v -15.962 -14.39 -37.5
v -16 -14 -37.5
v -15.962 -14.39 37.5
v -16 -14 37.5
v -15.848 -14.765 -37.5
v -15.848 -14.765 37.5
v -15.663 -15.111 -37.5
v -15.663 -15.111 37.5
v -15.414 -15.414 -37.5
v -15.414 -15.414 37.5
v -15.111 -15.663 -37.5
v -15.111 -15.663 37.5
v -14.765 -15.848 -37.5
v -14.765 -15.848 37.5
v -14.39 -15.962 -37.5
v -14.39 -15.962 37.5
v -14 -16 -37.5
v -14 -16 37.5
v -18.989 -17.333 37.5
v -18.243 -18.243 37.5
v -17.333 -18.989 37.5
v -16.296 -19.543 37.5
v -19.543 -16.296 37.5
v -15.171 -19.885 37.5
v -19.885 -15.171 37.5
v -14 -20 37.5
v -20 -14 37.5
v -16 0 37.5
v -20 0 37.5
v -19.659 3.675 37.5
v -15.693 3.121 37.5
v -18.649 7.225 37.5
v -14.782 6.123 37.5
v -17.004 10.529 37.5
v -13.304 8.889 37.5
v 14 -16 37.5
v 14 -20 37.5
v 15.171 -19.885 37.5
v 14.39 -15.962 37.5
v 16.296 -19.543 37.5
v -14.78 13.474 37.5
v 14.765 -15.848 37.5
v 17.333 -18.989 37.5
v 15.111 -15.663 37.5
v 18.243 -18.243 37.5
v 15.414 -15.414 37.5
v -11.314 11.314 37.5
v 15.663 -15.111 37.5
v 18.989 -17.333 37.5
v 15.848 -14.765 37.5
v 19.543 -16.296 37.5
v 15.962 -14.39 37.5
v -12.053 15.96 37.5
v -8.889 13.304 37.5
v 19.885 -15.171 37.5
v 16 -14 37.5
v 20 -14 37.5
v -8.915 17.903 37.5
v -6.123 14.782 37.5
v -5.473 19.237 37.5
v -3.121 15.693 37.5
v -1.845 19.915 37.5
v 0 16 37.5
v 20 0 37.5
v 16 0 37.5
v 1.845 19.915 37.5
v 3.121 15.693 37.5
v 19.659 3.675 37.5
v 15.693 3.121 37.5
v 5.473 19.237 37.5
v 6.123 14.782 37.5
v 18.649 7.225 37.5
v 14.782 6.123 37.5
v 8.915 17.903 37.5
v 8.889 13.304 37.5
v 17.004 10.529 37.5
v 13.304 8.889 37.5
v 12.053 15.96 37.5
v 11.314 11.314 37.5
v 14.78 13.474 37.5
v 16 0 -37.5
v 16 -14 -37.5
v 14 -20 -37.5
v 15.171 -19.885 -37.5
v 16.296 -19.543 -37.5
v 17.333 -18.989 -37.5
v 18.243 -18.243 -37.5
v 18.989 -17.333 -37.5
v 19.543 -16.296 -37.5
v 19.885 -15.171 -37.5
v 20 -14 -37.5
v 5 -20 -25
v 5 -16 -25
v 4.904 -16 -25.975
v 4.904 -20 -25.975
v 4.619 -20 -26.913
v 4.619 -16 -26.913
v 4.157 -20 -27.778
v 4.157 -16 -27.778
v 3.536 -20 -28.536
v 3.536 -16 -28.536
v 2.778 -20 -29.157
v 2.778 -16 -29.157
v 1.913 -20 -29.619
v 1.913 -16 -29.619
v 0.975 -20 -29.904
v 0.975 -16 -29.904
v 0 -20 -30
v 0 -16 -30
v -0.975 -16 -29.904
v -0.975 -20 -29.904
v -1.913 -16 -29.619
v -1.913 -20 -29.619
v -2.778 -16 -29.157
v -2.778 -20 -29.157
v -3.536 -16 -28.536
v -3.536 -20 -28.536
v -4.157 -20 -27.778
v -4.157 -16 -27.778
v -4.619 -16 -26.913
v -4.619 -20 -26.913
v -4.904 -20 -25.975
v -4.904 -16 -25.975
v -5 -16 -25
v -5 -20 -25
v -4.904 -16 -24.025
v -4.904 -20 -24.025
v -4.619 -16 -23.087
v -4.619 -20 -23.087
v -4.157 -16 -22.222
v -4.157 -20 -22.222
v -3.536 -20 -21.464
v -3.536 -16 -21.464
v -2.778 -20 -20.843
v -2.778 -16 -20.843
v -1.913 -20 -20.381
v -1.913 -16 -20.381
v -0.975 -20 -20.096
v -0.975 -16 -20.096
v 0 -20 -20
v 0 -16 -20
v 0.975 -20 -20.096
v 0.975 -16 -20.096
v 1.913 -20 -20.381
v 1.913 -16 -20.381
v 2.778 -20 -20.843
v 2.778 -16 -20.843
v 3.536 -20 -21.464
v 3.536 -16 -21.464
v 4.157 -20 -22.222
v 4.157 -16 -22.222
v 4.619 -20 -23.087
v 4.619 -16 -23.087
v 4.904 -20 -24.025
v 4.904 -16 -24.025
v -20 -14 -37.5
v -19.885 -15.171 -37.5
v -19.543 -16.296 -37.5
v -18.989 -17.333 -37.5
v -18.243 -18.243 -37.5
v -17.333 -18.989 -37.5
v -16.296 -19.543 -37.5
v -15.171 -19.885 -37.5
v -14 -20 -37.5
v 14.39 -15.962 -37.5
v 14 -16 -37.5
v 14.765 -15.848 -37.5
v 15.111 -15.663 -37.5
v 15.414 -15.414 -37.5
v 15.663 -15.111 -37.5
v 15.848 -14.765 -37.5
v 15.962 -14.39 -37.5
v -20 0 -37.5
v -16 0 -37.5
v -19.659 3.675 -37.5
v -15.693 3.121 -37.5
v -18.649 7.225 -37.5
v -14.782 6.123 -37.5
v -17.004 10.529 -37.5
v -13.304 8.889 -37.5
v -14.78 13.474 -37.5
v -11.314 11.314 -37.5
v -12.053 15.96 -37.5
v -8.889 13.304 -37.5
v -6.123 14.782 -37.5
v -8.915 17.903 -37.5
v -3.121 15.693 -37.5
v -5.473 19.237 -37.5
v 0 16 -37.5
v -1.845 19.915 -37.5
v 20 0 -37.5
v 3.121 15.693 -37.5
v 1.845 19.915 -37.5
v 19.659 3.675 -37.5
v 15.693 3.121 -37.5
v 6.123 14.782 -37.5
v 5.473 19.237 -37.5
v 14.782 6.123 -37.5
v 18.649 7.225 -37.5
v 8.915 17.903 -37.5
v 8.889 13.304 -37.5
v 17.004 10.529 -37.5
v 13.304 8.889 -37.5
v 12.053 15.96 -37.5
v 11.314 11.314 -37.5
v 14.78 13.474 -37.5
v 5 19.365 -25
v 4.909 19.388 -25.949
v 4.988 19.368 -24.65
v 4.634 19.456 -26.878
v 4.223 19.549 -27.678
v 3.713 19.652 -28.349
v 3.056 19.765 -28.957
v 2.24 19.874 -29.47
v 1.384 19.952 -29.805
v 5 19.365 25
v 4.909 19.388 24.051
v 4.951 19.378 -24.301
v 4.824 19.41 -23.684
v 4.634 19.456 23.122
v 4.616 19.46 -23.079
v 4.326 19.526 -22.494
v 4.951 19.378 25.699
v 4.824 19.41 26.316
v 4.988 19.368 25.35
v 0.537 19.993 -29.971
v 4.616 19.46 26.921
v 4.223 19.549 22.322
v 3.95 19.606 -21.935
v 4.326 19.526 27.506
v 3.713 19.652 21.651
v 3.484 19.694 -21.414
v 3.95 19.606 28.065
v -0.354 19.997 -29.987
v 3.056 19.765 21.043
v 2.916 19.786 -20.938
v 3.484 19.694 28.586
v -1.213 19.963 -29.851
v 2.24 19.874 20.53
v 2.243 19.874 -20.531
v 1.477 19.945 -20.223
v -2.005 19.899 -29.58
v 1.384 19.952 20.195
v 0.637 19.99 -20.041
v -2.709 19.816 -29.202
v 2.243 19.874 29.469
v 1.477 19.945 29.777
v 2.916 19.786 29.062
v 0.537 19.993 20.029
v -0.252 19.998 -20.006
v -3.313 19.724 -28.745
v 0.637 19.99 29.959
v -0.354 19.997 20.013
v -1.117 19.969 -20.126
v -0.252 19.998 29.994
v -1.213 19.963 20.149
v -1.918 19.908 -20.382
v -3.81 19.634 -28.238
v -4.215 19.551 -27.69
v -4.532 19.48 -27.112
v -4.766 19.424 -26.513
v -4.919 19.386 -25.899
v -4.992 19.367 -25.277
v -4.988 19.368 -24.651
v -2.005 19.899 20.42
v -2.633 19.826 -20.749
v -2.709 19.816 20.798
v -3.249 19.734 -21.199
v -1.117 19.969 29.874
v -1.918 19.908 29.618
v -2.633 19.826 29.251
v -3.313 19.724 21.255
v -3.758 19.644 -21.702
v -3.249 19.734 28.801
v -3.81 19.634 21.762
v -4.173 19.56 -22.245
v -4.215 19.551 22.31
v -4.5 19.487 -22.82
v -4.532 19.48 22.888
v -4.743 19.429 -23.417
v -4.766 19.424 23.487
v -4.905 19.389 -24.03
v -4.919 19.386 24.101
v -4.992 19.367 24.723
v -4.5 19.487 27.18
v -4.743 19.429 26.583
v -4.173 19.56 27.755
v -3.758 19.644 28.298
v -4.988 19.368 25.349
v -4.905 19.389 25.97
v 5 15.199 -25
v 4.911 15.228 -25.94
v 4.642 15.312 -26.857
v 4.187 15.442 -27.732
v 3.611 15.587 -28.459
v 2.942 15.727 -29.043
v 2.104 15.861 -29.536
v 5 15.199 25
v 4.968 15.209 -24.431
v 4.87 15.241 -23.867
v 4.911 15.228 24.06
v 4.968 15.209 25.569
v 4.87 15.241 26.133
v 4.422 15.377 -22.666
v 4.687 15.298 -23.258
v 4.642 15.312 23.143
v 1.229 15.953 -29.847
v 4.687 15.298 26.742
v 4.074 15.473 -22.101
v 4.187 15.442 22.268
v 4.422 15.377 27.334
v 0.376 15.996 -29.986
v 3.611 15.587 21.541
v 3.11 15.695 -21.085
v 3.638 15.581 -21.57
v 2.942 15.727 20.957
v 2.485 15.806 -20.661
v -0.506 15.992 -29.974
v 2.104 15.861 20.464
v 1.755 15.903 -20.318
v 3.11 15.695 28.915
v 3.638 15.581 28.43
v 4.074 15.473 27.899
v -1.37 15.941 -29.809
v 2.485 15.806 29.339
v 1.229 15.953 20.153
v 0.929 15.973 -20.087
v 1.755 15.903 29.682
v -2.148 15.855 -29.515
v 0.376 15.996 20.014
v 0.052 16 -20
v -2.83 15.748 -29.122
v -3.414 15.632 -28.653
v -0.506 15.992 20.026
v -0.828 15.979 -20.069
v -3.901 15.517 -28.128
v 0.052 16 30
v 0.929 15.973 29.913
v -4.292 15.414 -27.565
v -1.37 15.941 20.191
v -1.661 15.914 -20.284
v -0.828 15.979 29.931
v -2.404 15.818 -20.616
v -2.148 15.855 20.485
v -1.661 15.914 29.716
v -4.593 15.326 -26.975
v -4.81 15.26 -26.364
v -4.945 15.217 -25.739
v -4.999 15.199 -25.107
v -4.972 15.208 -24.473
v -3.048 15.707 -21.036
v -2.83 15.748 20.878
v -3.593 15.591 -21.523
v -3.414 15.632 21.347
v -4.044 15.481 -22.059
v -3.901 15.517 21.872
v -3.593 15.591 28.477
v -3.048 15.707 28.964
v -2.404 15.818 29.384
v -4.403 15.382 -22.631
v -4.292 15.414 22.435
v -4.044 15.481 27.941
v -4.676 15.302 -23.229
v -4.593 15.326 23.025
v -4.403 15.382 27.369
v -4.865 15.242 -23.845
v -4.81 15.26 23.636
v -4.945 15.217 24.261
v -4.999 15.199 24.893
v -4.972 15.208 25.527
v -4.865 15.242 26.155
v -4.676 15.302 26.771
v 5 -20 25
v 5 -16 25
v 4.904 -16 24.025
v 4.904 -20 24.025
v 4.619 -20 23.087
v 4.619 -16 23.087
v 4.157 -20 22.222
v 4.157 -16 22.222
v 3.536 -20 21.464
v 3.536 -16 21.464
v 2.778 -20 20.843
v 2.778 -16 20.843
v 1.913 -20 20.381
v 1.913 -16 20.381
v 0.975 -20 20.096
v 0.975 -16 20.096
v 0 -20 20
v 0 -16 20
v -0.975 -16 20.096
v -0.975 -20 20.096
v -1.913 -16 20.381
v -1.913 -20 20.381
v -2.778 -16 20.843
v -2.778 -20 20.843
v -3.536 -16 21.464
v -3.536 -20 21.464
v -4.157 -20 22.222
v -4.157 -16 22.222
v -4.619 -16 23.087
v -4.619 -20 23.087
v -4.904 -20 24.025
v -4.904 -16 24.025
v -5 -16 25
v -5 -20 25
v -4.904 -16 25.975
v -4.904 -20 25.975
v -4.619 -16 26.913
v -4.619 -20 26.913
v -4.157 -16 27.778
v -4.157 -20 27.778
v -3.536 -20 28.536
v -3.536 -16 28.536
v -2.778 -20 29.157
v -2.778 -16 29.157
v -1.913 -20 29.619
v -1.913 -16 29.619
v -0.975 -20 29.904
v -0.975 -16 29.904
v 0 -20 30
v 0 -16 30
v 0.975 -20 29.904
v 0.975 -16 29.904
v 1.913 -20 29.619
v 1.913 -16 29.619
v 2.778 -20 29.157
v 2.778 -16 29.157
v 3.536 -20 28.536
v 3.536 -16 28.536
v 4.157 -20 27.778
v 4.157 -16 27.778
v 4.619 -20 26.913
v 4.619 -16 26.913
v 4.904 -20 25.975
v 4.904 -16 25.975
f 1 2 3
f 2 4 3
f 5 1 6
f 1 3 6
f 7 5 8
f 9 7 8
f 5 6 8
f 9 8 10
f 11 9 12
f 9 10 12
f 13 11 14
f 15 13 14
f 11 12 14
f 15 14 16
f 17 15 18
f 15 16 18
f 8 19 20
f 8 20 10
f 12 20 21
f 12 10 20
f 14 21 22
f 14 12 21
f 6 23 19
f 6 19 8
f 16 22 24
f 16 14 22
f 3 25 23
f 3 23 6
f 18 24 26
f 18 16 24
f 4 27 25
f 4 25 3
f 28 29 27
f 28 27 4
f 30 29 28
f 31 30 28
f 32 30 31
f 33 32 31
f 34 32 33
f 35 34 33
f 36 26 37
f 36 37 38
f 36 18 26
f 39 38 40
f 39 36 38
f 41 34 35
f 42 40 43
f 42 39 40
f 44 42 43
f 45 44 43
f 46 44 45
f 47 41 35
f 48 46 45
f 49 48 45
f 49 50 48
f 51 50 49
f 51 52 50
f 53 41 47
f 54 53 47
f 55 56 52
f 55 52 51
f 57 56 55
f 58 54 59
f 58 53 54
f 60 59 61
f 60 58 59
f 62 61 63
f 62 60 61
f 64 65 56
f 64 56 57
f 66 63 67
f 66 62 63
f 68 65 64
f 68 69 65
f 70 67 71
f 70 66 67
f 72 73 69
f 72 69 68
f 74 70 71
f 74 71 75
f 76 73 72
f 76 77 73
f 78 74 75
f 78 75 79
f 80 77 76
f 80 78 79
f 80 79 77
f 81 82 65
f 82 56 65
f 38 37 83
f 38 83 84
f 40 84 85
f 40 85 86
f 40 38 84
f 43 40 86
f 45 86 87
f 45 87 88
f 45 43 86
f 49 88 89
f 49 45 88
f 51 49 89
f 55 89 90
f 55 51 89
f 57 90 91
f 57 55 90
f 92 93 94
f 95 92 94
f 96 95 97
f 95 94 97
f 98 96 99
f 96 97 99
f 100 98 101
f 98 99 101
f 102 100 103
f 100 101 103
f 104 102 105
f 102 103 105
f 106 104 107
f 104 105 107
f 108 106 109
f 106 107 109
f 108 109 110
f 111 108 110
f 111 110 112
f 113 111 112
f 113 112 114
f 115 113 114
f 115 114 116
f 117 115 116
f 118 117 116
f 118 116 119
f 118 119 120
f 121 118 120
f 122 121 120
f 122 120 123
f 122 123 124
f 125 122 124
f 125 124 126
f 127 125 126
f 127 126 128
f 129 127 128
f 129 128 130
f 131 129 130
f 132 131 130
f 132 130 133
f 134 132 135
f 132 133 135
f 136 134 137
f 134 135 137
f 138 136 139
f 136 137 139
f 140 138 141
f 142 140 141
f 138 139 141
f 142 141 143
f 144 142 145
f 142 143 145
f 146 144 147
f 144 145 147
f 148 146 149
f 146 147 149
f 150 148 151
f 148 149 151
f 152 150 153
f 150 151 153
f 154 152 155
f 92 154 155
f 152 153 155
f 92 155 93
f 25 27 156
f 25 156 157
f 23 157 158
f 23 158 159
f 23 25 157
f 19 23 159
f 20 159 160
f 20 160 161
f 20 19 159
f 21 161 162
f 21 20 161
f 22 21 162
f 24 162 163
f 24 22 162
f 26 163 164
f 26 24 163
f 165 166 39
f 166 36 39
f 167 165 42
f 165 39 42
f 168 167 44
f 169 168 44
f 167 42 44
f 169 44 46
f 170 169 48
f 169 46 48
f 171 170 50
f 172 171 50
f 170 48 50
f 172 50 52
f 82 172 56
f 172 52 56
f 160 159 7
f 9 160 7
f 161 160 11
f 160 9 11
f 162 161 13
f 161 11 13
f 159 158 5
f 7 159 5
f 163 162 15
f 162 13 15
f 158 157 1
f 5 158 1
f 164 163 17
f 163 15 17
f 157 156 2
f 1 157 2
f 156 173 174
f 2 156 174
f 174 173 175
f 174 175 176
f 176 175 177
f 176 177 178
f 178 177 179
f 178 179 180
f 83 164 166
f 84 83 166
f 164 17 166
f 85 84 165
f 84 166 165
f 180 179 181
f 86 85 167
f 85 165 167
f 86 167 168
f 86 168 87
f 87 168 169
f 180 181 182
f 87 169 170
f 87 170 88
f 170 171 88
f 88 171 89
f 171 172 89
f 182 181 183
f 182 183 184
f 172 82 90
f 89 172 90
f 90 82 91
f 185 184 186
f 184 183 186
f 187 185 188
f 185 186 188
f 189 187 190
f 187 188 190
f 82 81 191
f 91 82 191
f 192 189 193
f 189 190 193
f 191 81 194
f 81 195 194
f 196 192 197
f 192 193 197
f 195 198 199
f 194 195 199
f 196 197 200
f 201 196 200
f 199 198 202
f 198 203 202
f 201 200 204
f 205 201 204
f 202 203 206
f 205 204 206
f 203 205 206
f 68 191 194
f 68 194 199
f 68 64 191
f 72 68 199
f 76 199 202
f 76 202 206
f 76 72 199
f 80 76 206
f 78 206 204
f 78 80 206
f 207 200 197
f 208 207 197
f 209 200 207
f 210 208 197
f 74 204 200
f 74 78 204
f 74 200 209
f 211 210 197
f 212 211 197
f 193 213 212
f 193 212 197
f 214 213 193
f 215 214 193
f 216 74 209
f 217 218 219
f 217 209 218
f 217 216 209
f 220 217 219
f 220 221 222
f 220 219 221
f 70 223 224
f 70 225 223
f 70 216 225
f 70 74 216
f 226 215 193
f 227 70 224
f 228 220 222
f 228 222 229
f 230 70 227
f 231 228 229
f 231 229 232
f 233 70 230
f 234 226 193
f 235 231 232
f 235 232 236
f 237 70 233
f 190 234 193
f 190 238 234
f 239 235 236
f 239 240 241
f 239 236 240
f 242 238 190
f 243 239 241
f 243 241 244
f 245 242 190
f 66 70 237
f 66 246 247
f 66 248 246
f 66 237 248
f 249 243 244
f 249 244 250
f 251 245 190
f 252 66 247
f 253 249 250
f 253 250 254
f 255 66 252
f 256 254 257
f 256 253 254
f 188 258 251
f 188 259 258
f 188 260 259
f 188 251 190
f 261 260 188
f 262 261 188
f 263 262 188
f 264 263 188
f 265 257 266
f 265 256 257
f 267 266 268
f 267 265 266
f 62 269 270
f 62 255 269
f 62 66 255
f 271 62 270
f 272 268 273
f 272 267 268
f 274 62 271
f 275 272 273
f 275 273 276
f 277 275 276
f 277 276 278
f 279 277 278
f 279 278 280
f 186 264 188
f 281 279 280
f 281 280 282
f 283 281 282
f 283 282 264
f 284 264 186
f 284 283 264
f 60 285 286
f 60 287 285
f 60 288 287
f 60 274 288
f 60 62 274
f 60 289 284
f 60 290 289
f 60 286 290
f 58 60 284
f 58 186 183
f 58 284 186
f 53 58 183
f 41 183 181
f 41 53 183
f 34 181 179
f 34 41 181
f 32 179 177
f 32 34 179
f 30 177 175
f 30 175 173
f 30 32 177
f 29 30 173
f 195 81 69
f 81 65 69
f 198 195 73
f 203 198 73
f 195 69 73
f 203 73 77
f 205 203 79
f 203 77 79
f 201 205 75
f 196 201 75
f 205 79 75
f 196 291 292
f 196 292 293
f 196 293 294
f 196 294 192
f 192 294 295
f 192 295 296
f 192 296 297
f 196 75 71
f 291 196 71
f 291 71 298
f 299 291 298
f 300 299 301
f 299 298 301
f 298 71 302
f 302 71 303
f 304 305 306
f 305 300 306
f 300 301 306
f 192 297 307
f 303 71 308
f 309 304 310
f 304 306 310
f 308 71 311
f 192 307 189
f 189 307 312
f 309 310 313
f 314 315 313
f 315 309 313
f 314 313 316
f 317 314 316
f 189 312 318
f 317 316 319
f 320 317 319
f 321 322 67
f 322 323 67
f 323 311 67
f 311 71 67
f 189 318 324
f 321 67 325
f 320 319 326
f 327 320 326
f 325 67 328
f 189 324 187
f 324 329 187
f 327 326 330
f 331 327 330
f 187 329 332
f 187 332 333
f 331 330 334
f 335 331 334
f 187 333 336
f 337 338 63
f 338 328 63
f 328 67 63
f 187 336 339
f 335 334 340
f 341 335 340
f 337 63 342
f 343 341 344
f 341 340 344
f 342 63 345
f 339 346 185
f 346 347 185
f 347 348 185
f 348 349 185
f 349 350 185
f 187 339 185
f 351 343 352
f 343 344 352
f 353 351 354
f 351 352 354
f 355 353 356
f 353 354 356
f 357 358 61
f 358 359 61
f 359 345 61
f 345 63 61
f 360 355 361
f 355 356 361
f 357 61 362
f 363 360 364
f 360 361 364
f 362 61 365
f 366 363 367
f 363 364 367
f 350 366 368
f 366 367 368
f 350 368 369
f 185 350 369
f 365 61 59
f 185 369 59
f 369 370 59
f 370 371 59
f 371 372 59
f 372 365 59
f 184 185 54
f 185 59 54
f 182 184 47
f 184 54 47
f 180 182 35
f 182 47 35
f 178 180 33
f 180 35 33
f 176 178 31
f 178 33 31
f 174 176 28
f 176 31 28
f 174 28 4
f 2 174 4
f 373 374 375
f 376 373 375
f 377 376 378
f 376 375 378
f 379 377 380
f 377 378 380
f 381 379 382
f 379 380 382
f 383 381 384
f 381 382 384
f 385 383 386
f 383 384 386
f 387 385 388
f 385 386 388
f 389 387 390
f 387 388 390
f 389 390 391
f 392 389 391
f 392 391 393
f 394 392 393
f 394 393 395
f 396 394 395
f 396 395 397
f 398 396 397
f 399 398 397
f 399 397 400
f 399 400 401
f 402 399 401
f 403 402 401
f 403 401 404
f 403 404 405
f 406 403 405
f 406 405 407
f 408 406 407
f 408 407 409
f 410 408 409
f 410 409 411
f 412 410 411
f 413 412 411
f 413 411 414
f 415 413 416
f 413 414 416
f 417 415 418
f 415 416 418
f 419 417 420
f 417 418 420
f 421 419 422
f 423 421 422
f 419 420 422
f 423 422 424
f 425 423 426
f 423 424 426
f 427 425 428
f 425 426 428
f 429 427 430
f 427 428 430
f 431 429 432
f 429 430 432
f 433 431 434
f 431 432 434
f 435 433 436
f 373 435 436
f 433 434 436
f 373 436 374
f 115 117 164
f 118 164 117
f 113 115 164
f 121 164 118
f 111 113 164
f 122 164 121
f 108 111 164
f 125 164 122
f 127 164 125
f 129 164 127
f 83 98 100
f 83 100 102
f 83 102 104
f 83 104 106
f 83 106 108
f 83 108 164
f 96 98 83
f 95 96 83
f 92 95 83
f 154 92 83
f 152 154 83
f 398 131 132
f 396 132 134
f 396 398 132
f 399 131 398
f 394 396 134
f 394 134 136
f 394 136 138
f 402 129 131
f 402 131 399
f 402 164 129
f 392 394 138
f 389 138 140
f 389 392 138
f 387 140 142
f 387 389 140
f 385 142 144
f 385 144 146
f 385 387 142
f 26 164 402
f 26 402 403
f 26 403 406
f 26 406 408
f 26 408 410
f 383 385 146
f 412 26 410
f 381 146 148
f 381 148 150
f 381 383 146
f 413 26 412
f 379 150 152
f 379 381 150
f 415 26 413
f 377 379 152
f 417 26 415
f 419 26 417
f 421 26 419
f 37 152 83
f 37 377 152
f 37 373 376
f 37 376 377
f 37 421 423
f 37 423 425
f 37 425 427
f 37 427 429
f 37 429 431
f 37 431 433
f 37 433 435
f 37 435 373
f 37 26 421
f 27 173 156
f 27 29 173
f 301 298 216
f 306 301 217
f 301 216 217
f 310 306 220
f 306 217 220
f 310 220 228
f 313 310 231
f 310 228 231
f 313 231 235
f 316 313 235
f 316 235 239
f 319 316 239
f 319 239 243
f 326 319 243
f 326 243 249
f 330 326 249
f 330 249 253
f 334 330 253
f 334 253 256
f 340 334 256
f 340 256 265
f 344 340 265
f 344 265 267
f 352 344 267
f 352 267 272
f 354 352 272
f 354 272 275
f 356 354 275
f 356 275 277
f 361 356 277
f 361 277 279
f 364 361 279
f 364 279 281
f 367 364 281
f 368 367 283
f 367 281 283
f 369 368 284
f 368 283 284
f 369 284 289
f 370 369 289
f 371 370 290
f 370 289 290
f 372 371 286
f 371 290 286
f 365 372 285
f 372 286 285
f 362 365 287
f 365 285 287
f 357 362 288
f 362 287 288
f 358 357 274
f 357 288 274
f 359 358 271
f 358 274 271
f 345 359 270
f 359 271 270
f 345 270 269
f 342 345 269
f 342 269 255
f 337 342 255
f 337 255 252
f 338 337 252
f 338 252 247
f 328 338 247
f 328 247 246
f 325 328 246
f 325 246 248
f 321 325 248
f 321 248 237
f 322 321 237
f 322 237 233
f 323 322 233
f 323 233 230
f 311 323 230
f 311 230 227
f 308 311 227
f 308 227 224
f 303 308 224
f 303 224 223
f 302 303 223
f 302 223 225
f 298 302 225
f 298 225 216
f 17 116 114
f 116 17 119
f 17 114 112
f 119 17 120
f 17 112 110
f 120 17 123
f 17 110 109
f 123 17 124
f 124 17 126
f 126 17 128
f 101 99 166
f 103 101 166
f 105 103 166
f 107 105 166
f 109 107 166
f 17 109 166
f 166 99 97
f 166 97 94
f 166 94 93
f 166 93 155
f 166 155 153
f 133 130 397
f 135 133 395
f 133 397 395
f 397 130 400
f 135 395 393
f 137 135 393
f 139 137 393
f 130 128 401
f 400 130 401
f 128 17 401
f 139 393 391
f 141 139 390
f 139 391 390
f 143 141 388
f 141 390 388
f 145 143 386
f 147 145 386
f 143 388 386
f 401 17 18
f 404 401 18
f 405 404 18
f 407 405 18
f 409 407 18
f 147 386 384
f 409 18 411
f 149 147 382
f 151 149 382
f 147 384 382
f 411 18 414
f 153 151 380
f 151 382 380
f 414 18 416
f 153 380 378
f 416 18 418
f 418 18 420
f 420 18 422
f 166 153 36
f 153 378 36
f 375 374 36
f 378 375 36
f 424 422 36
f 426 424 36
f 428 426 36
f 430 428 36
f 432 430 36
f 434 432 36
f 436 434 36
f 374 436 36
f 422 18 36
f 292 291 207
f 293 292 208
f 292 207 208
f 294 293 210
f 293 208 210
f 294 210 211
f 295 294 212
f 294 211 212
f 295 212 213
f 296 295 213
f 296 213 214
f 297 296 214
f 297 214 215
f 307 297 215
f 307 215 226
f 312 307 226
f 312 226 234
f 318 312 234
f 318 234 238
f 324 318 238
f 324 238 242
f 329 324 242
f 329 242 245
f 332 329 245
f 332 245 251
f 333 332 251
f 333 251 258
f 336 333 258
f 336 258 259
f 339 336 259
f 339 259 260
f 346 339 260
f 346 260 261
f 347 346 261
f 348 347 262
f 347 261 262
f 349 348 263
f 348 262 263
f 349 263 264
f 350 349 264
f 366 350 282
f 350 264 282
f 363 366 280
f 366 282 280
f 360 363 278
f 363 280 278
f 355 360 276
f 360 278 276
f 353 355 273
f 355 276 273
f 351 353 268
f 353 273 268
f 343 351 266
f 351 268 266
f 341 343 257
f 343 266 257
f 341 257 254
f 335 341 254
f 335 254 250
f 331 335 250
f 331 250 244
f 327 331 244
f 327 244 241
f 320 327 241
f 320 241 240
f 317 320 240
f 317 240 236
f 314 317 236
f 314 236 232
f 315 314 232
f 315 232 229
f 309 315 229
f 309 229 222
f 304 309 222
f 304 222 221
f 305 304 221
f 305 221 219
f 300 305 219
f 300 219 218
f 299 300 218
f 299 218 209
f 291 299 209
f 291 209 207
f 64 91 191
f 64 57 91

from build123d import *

# Parameters (mm, degrees)
SALIENTE_EXTRUIR1_DEPTH       = 37.5
PERCEUSE_COLONNE_POUR_M1_61_D = 10


with BuildPart() as part:
    # Croquis1 → Saliente-Extruir1 (new body, symmetric)
    with BuildSketch(Plane.XY):
        with BuildLine():
            Line((-20, 0), (-20, -14))
            ThreePointArc((-20, -14), (-18.242640687, -18.242640687), (-14, -20))
            Line((-14, -20), (14, -20))
            ThreePointArc((14, -20), (18.242640687, -18.242640687), (20, -14))
            Line((20, -14), (20, 0))
            ThreePointArc((20, 0), (0, 20), (-20, 0))
        make_face()
        with BuildLine():
            Line((-16, 0), (-16, -14))
            ThreePointArc((-16, -14), (-15.414213562, -15.414213562), (-14, -16))
            Line((-14, -16), (14, -16))
            ThreePointArc((14, -16), (15.414213562, -15.414213562), (16, -14))
            Line((16, -14), (16, 0))
            ThreePointArc((16, 0), (0, 16), (-16, 0))
        make_face(mode=Mode.SUBTRACT)
    extrude(amount=SALIENTE_EXTRUIR1_DEPTH, both=True)

    # Perceuse à colonne pour M1.61 (through all)
    with Locations(Plane(origin=(0, -20, 0), x_dir=(-1, 0, 0), z_dir=(0, -1, 0))):
        with Locations((0, -25), (0, 25)):
            Hole(PERCEUSE_COLONNE_POUR_M1_61_D / 2)


solid = part.part
